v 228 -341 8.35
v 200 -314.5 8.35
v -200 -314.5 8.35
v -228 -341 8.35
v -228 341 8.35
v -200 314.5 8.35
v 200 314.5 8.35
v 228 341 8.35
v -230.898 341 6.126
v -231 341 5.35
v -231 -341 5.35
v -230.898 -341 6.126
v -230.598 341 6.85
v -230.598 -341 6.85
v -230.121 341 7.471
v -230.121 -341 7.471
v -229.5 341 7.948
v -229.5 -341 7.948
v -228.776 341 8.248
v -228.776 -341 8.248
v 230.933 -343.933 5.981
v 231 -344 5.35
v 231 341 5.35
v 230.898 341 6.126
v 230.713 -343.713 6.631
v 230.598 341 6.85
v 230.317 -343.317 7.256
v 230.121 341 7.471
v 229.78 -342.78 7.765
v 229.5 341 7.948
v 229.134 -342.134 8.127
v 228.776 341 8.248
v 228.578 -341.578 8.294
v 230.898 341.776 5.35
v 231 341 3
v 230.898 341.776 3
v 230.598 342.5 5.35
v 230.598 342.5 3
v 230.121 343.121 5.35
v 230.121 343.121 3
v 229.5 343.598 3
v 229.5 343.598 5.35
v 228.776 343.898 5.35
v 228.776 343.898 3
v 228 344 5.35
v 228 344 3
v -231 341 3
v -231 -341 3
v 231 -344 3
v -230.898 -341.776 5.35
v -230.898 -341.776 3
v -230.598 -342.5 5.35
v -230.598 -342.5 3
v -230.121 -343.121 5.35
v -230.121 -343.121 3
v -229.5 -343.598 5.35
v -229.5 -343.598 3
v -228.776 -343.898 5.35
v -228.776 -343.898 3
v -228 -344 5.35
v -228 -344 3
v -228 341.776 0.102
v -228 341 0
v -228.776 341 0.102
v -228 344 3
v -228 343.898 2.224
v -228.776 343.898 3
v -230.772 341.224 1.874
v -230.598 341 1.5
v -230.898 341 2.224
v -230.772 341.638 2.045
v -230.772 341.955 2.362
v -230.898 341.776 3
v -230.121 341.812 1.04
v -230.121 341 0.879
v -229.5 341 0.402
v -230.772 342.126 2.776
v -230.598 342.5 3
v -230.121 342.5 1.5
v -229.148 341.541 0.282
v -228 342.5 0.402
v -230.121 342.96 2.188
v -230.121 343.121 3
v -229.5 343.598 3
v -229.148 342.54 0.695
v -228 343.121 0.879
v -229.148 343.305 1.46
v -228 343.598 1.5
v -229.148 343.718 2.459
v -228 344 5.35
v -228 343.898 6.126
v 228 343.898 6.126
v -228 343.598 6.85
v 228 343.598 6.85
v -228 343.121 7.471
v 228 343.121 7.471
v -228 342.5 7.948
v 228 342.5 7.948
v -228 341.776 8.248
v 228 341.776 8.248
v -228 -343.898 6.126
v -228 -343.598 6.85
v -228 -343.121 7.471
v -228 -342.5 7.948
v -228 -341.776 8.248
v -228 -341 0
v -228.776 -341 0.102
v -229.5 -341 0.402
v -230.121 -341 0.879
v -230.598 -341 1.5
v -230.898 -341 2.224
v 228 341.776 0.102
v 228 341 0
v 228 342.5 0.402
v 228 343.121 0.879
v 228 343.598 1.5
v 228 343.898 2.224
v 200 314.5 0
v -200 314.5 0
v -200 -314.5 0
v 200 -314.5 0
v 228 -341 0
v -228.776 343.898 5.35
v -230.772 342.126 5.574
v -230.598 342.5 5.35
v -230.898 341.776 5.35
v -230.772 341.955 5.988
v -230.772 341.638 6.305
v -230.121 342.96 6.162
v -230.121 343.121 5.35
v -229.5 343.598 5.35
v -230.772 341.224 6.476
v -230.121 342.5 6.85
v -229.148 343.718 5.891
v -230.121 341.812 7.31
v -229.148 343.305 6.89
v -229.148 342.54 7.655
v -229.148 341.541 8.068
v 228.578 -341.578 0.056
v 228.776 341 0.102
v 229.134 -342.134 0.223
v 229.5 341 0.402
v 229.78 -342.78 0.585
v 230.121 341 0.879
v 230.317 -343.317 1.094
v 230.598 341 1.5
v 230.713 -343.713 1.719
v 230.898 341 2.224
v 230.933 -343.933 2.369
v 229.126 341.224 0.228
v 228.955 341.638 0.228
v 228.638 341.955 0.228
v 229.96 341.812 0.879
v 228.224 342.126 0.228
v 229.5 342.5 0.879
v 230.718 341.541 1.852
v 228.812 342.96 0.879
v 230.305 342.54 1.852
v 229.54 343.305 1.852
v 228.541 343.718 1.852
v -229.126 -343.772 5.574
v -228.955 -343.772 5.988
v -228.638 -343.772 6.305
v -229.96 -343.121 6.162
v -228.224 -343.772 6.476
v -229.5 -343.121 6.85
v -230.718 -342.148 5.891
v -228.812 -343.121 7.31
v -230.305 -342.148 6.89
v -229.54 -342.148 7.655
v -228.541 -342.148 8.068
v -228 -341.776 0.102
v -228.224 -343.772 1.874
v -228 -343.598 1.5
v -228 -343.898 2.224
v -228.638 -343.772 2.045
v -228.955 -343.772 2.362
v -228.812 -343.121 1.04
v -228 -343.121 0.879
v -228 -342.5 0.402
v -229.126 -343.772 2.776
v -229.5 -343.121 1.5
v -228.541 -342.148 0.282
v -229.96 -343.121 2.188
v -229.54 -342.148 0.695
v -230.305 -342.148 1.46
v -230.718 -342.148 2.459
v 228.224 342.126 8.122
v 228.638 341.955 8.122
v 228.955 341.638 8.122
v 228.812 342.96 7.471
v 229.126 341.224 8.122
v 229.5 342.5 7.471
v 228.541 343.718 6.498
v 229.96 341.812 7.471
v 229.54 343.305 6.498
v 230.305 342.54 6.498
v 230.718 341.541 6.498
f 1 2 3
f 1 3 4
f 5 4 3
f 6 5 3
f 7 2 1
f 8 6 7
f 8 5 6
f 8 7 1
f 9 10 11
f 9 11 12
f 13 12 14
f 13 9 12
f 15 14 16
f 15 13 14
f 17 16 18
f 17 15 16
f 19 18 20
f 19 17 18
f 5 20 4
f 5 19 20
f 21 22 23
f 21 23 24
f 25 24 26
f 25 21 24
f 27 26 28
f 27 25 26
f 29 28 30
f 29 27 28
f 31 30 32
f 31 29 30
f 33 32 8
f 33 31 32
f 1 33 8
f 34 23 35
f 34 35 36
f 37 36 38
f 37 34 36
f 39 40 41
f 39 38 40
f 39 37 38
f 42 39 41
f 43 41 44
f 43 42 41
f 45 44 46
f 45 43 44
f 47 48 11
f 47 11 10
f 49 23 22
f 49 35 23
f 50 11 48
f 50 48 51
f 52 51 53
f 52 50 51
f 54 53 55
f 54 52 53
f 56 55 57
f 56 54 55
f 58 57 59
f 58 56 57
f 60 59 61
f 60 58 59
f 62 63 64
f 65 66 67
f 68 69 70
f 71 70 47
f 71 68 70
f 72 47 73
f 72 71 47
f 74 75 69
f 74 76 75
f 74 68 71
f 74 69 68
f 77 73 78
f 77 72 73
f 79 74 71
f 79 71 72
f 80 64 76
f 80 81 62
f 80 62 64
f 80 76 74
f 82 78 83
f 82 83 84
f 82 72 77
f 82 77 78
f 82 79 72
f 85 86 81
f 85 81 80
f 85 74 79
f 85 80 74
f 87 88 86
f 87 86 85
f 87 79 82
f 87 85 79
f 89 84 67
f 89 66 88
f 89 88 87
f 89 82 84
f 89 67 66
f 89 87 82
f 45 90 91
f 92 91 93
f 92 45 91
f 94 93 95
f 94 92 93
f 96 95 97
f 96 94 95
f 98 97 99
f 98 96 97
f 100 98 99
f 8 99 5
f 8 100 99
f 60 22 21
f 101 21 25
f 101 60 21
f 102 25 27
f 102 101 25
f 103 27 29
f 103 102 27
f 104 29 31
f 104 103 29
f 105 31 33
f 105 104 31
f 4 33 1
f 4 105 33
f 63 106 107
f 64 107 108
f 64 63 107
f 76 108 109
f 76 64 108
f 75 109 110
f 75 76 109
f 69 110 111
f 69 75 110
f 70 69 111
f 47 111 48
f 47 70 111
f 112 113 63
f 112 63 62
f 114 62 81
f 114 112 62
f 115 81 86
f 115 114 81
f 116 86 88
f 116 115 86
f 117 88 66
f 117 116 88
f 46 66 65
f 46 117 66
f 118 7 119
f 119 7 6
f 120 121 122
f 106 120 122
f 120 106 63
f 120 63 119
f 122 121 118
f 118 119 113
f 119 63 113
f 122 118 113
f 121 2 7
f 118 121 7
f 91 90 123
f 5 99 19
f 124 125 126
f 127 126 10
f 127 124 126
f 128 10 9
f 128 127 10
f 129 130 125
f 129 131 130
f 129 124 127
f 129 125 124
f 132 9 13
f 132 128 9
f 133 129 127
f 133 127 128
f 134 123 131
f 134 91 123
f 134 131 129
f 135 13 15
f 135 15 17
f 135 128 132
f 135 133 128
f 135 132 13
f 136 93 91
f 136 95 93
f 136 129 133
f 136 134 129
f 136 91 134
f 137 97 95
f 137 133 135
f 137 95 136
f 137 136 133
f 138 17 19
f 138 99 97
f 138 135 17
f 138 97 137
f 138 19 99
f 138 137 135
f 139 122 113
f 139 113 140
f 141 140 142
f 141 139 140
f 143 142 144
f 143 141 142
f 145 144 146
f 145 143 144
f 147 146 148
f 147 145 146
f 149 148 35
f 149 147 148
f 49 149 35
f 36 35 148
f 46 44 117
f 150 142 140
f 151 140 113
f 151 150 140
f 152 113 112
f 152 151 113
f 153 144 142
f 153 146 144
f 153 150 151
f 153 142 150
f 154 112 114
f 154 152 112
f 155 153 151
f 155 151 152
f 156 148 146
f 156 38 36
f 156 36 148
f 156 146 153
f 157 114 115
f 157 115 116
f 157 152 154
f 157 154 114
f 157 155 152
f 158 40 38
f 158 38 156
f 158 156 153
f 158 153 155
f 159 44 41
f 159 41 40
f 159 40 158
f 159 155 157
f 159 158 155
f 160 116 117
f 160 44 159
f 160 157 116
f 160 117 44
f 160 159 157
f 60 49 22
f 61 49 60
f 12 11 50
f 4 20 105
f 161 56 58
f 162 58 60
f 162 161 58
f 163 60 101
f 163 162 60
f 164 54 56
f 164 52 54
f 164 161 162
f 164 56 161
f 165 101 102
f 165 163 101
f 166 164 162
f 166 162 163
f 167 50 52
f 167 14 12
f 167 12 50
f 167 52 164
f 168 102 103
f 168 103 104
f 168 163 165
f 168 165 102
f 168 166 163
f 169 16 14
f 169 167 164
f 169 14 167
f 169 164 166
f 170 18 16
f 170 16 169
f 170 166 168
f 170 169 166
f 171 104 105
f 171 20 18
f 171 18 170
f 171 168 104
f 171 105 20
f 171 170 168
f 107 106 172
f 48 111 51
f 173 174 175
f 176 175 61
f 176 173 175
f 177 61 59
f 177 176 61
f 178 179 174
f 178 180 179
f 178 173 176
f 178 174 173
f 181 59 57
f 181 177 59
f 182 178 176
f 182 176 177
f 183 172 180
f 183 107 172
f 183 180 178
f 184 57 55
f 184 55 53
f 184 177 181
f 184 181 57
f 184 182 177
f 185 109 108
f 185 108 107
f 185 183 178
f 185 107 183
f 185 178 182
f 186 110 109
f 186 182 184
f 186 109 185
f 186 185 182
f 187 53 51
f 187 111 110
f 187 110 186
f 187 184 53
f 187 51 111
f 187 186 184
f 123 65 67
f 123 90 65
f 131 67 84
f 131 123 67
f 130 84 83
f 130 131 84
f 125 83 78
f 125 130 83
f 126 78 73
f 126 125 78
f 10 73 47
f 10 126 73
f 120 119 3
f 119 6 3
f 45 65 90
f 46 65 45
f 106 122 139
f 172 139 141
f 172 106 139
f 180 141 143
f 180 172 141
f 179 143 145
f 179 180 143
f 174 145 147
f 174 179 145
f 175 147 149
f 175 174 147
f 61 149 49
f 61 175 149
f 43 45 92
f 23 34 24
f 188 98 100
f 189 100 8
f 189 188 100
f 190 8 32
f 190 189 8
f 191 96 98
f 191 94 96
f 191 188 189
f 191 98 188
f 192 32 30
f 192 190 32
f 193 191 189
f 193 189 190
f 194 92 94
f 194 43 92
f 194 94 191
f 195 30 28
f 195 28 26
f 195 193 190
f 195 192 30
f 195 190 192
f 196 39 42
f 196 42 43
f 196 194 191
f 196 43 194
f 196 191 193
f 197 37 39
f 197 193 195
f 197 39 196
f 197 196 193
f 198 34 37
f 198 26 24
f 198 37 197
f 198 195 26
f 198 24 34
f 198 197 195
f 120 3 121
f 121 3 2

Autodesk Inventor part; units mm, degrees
ref_plane "YZ Plane" through (0, 0, 0) normal (1, 0, 0) x (0, 1, 0)
ref_plane "XZ Plane" through (0, 0, 0) normal (0, 1, 0) x (-1, 0, 0)
ref_plane "XY Plane" through (0, 0, 0) normal (0, 0, 1) x (1, 0, 0)
sketch "スケッチ1" plane through (0, 0, 0) normal (0, 0, 1) x (1, 0, 0)
  line L0 (-231, 344) -> (231, 344)
  line L1 (231, 344) -> (231, -344)
  line L2 (231, -344) -> (-231, -344)
  line L3 (-231, -344) -> (-231, 344)
  line L4 (-231, 344) -> (231, -344) construction
  line L5 (231, 344) -> (-231, -344) construction
  point P0 (0, 0)
  dimension "d0" = 462
  dimension "d1" = 688
extrude "押し出し1" add sketch "スケッチ1" along normal blind 8.35
sketch "スケッチ2" plane through (0, 0, 8.35) normal (0, 0, 1) x (1, 0, 0)
  line L0 (-200, -314.5) -> (200, -314.5)
  line L1 (200, -314.5) -> (200, 314.5)
  line L2 (200, 314.5) -> (-200, 314.5)
  line L3 (-200, 314.5) -> (-200, -314.5)
  line L4 (-200, -314.5) -> (200, 314.5) construction
  line L5 (200, -314.5) -> (-200, 314.5) construction
  point P0 (0, 0)
  dimension "d4" = 400
  dimension "d5" = 629
extrude "押し出し2" cut sketch "スケッチ2" against normal blind 8.35
fillet "フィレット1" radius 3 11 edges at (231, 344, 4.175) (231, 0, 8.35) (0, 344, 8.35) (0, 344, 0) (231, 0, 0) (-231, 344, 4.175) (-231, 0, 8.35) (-231, 0, 0) (-231, -344, 4.175) (0, -344, 8.35) (0, -344, 0)
properties part number "lowerGom"
